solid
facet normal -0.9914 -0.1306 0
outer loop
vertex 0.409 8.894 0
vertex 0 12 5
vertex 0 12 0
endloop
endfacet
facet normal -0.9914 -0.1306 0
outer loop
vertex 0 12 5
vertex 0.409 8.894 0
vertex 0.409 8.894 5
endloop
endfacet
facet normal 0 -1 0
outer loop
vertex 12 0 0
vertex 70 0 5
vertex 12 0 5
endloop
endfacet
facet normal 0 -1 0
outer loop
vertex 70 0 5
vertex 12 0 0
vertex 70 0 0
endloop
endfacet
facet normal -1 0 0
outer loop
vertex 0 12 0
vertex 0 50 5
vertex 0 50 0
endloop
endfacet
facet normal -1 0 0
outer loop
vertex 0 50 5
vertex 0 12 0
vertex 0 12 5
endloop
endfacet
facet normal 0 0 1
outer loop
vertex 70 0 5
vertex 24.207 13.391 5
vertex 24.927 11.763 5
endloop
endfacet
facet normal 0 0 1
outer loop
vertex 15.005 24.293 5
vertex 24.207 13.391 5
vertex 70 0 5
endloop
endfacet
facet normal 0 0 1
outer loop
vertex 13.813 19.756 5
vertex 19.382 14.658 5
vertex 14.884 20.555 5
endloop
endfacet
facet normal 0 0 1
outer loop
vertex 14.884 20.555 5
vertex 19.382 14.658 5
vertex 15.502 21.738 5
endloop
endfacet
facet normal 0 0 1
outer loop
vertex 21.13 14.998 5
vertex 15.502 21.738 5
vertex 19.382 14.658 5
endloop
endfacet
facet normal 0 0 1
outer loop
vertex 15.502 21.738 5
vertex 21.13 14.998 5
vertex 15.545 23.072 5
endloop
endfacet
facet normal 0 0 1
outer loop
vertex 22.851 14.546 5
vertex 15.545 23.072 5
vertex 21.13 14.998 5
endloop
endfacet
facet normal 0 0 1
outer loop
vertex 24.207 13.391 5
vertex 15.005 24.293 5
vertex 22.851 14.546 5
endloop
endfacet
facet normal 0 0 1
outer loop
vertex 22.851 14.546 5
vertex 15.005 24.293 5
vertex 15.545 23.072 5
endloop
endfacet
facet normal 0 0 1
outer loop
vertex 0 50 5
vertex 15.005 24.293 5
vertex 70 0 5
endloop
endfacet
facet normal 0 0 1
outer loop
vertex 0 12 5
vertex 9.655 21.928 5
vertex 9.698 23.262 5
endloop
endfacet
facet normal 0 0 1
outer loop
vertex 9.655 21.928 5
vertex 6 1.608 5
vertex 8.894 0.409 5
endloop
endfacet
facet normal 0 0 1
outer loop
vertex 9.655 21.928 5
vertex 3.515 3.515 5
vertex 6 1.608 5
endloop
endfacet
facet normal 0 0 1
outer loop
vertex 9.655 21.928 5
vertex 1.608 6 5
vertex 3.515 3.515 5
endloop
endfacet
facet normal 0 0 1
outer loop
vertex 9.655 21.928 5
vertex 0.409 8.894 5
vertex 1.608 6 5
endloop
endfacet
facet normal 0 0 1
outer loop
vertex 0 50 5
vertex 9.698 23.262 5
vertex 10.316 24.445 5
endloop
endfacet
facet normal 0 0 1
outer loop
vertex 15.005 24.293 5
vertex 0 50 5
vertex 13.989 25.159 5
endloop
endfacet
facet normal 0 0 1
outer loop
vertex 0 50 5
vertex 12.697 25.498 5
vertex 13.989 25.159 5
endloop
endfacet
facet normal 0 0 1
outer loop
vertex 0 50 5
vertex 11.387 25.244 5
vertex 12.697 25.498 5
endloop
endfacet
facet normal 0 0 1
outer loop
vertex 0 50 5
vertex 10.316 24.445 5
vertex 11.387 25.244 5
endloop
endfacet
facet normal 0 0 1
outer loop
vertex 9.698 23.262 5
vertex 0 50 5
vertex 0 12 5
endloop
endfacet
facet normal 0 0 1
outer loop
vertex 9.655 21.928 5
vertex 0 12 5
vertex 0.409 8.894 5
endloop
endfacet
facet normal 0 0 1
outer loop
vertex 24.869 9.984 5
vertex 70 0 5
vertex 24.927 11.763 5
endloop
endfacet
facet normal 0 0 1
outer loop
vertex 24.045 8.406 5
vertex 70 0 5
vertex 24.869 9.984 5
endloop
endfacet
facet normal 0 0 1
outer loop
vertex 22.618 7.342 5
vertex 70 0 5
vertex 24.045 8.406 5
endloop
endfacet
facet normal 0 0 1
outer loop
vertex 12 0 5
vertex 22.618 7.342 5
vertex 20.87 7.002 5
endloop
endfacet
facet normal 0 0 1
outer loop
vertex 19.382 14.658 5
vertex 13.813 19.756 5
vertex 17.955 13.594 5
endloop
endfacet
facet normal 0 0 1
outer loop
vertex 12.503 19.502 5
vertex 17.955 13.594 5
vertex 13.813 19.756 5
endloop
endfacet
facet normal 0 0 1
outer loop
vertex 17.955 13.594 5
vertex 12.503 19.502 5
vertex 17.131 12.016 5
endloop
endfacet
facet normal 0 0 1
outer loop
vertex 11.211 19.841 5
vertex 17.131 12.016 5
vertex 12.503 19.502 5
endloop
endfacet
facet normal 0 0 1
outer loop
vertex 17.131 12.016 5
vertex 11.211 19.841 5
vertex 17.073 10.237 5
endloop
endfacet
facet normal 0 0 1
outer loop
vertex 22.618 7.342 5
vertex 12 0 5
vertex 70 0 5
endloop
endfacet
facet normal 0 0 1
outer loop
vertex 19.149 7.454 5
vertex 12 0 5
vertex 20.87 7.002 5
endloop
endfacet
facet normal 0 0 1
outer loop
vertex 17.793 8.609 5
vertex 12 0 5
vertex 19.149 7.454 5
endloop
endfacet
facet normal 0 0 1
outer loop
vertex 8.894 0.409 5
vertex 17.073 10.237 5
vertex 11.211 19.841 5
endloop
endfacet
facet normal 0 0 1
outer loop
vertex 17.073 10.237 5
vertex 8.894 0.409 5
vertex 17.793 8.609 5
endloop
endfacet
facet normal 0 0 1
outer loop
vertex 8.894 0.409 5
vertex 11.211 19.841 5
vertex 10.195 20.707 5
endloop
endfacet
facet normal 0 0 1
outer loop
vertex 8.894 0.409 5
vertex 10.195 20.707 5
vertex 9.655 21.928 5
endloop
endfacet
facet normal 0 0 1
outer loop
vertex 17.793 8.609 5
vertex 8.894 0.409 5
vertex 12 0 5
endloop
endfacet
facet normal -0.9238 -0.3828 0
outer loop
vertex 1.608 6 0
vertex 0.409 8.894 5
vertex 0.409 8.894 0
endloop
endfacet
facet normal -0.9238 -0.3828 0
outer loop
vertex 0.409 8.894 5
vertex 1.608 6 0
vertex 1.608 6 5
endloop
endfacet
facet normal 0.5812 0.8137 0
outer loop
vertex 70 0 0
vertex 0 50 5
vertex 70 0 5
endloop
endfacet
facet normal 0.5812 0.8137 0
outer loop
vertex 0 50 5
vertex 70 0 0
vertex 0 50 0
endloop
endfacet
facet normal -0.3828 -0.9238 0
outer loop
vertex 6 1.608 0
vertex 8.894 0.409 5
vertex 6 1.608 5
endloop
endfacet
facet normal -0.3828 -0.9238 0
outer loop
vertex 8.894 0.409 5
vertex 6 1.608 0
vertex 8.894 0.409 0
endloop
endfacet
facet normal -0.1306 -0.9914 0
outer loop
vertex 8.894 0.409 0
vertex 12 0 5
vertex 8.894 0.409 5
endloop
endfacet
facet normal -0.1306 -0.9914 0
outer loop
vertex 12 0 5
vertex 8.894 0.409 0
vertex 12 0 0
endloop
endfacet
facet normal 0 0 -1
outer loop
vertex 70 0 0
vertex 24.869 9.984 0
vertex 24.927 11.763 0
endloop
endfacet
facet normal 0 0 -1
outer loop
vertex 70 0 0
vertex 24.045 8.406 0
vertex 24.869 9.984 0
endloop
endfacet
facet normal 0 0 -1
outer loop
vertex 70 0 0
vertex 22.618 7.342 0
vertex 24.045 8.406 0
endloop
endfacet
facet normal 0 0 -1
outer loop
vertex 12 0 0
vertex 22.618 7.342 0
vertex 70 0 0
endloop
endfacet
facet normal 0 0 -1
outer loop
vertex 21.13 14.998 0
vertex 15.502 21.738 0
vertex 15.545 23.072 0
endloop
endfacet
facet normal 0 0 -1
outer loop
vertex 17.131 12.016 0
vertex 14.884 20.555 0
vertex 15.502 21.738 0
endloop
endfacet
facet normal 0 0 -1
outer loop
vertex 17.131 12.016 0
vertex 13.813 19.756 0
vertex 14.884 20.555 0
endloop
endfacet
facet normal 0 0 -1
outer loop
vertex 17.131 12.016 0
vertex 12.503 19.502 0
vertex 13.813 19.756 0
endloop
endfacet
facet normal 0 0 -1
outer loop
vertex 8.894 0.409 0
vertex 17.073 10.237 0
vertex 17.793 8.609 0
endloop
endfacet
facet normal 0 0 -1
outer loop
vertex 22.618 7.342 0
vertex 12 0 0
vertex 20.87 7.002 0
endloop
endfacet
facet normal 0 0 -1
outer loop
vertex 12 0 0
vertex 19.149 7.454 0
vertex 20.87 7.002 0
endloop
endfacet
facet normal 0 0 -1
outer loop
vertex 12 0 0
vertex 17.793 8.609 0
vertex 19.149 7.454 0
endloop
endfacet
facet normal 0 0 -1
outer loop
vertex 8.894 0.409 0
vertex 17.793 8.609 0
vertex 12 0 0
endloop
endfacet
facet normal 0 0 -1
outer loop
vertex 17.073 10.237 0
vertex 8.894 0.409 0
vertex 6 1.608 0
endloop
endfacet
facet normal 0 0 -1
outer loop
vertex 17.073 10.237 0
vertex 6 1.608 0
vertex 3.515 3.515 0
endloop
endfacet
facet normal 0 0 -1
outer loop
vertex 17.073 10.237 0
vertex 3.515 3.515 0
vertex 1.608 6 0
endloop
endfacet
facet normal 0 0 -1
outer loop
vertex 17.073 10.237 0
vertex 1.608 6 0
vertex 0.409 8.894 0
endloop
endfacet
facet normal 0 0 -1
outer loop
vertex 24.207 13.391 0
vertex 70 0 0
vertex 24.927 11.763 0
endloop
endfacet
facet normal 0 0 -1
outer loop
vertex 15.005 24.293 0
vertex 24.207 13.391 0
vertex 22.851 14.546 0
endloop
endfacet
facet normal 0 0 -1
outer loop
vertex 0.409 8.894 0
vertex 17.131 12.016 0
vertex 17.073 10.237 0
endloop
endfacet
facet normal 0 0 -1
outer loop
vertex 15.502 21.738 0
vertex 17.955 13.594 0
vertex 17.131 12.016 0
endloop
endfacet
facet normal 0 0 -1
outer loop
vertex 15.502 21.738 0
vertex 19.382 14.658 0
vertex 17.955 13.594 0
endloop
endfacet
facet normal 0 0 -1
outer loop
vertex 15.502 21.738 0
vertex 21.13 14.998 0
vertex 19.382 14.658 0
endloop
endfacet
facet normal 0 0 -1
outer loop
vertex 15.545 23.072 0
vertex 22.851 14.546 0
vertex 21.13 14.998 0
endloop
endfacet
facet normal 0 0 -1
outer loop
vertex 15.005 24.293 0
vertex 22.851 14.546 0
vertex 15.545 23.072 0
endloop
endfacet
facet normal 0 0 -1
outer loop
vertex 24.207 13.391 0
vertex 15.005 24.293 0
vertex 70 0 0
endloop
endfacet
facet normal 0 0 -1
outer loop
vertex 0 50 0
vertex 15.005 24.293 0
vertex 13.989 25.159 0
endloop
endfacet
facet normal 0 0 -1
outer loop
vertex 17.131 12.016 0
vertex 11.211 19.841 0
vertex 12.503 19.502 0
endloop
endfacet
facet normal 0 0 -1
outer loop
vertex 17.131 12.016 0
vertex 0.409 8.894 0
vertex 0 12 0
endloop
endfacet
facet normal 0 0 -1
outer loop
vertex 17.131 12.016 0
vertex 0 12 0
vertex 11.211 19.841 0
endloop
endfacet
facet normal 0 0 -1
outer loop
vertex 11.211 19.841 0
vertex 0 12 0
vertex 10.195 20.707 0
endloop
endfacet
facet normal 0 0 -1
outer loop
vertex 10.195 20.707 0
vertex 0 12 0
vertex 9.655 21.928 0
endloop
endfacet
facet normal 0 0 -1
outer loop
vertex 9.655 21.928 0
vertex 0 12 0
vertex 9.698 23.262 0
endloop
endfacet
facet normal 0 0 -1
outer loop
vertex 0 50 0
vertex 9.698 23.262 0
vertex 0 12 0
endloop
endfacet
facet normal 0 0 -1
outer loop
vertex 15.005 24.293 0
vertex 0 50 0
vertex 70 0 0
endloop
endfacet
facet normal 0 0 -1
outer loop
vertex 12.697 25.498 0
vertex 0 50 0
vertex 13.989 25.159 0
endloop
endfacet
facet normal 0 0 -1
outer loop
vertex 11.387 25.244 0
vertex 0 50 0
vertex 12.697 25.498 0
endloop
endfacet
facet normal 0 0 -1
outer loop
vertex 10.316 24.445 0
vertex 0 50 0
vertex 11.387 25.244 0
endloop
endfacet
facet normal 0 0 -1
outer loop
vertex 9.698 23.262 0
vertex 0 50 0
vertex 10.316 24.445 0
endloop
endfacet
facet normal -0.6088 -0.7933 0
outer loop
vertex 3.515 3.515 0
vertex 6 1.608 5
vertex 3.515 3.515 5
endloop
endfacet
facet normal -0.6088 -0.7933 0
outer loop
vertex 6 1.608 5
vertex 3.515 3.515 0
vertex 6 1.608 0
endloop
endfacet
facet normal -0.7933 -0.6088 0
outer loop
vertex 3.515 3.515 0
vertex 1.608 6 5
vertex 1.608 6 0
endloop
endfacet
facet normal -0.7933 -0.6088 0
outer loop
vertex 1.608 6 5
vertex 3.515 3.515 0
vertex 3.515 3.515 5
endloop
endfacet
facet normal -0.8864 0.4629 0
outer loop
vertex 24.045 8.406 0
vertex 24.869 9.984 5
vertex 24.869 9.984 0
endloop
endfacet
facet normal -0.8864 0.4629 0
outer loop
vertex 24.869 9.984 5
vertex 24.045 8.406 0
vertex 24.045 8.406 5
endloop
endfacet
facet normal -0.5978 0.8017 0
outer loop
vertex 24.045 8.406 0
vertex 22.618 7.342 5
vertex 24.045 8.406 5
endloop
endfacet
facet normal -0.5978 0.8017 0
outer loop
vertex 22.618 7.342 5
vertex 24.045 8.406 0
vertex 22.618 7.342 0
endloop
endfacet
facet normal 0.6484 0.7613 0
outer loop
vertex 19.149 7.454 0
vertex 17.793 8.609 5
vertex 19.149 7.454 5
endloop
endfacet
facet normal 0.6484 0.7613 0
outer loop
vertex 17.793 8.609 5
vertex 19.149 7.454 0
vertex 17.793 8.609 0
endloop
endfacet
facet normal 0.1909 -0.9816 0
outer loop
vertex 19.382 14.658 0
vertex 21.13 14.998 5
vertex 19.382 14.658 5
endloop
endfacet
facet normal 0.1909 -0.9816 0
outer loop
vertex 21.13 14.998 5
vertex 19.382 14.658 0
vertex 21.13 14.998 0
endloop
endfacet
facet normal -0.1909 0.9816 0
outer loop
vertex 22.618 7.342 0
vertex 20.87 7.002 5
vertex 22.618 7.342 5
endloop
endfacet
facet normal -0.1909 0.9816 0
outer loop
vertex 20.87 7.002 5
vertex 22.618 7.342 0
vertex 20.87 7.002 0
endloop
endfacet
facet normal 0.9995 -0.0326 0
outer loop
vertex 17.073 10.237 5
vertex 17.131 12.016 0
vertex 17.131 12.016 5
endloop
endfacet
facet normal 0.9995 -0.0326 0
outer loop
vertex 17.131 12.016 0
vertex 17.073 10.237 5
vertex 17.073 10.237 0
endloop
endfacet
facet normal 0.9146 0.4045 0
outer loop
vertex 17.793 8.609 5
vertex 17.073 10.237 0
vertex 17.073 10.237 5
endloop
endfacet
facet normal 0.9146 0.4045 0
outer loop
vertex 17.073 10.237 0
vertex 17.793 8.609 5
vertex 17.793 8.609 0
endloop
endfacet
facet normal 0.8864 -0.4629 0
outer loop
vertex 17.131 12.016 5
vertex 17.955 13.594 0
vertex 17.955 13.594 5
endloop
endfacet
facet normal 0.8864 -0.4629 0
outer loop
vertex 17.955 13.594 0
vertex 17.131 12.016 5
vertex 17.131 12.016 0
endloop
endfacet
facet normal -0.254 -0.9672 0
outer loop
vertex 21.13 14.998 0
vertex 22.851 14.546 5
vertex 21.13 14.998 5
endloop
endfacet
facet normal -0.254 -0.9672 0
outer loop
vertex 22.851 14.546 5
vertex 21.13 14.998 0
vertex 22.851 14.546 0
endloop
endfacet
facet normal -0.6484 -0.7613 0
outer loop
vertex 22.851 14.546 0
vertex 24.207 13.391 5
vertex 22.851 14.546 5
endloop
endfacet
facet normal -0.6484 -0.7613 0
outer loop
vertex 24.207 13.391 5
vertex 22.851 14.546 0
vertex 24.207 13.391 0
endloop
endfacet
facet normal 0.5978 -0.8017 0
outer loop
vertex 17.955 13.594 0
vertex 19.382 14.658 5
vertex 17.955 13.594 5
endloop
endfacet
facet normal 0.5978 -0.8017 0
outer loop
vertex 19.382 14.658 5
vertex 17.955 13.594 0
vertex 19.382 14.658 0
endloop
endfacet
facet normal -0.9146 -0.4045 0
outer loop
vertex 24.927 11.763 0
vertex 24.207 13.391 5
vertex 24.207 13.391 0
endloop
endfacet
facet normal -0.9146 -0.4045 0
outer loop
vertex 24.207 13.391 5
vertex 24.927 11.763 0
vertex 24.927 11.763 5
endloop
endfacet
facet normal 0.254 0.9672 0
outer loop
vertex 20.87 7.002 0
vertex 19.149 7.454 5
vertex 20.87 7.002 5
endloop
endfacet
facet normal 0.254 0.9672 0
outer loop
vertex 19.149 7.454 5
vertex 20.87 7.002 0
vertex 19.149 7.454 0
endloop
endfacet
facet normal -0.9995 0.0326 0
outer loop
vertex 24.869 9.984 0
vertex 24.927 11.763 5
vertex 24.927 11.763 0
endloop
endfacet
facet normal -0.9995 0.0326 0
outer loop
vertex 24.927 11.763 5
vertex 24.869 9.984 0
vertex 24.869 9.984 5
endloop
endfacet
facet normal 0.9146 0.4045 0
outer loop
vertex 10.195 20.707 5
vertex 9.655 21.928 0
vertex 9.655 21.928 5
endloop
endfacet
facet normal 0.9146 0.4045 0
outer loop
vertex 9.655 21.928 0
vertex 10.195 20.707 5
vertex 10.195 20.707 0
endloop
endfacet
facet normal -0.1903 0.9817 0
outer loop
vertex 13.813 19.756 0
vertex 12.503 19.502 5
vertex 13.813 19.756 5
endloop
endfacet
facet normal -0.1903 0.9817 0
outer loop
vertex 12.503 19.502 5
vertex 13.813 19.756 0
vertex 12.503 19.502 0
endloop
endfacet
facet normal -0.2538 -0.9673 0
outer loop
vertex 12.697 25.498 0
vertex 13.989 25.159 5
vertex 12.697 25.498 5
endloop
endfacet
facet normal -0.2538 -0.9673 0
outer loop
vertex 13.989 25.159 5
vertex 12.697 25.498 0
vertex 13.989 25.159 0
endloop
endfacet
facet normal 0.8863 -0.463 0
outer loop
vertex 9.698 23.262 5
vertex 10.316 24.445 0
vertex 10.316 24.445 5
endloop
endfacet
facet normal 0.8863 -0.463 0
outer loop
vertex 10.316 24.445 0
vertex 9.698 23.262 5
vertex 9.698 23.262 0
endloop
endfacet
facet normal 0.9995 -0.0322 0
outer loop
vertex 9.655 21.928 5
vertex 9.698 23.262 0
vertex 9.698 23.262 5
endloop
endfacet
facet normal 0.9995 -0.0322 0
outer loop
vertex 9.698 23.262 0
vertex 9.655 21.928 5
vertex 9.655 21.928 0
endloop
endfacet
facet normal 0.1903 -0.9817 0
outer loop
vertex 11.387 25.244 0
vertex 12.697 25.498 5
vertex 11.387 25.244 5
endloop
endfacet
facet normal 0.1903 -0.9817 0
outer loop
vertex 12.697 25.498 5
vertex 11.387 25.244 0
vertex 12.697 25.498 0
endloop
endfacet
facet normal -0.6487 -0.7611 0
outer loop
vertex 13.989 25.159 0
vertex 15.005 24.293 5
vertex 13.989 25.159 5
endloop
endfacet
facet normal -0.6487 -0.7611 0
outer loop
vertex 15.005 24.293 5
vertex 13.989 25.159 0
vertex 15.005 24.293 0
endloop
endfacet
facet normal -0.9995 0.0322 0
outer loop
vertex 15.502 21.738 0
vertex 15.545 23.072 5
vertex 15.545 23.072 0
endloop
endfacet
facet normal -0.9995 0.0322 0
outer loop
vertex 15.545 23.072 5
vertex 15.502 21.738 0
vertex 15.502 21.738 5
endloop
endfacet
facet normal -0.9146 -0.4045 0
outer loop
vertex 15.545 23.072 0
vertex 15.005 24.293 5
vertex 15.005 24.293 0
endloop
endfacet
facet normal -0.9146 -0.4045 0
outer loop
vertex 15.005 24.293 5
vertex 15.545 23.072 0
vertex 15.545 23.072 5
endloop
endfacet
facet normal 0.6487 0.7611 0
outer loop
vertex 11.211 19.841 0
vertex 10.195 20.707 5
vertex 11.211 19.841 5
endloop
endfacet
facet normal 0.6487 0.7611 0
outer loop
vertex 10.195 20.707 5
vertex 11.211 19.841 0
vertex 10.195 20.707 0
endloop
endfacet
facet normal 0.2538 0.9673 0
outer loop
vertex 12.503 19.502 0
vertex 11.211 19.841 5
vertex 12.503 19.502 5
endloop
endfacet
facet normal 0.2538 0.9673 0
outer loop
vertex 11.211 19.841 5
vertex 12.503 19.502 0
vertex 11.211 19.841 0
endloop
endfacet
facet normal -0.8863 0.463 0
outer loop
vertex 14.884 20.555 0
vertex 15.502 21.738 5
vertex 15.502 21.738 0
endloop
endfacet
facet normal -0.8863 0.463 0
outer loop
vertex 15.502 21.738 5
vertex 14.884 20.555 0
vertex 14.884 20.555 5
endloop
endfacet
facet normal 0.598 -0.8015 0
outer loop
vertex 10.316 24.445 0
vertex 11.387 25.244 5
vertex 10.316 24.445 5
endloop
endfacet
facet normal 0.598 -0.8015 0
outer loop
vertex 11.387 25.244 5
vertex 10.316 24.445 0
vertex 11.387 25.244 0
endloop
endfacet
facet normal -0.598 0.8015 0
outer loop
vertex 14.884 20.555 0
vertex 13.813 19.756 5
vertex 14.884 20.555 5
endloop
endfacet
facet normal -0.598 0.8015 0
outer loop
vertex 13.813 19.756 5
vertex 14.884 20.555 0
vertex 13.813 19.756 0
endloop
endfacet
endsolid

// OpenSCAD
$fn = 32;

// ----------------------------------------------------------------------
// Bracket plate: corner pad 70 x 50, fillet R12
// ----------------------------------------------------------------------

// --- parameters (mm) ---
hole_r = 3;               // bolt hole radius
plate_t = 5;              // plate thickness, Z (extrusion height)
leg_a = 70;               // base leg
leg_b = 50;               // height leg
fillet_r = 12;            // right-angle fillet radius

hole_d1 = 2 * hole_r + 2;
hole_d2 = 2 * hole_r;

profile = [[12, 0], [70, 0], [0, 50], [0, 12], [0.409, 8.894], [1.608, 6], [3.515, 3.515], [6, 1.608], [8.894, 0.409]];  // primary outline, 9 points, counter clockwise
void_1 = [[24.927, 11.763], [24.207, 13.391], [22.851, 14.546], [21.13, 14.998], [19.382, 14.658], [17.955, 13.594], [17.131, 12.016], [17.073, 10.237], [17.793, 8.609], [19.149, 7.454], [20.87, 7.002], [22.618, 7.342], [24.045, 8.406], [24.869, 9.984]];  // mount hole 1, 14 points
void_2 = [[15.545, 23.072], [15.005, 24.293], [13.989, 25.159], [12.697, 25.498], [11.387, 25.244], [10.316, 24.445], [9.698, 23.262], [9.655, 21.928], [10.195, 20.707], [11.211, 19.841], [12.503, 19.502], [13.813, 19.756], [14.884, 20.555], [15.502, 21.738]];  // mount hole 2, 14 points

// --- the one profile operation ---
difference() {
  linear_extrude(height = plate_t) polygon(points = profile);
  translate([0, 0, -1])
    linear_extrude(height = plate_t + 2) polygon(points = void_1);
  translate([0, 0, -1])
    linear_extrude(height = plate_t + 2) polygon(points = void_2);
}
